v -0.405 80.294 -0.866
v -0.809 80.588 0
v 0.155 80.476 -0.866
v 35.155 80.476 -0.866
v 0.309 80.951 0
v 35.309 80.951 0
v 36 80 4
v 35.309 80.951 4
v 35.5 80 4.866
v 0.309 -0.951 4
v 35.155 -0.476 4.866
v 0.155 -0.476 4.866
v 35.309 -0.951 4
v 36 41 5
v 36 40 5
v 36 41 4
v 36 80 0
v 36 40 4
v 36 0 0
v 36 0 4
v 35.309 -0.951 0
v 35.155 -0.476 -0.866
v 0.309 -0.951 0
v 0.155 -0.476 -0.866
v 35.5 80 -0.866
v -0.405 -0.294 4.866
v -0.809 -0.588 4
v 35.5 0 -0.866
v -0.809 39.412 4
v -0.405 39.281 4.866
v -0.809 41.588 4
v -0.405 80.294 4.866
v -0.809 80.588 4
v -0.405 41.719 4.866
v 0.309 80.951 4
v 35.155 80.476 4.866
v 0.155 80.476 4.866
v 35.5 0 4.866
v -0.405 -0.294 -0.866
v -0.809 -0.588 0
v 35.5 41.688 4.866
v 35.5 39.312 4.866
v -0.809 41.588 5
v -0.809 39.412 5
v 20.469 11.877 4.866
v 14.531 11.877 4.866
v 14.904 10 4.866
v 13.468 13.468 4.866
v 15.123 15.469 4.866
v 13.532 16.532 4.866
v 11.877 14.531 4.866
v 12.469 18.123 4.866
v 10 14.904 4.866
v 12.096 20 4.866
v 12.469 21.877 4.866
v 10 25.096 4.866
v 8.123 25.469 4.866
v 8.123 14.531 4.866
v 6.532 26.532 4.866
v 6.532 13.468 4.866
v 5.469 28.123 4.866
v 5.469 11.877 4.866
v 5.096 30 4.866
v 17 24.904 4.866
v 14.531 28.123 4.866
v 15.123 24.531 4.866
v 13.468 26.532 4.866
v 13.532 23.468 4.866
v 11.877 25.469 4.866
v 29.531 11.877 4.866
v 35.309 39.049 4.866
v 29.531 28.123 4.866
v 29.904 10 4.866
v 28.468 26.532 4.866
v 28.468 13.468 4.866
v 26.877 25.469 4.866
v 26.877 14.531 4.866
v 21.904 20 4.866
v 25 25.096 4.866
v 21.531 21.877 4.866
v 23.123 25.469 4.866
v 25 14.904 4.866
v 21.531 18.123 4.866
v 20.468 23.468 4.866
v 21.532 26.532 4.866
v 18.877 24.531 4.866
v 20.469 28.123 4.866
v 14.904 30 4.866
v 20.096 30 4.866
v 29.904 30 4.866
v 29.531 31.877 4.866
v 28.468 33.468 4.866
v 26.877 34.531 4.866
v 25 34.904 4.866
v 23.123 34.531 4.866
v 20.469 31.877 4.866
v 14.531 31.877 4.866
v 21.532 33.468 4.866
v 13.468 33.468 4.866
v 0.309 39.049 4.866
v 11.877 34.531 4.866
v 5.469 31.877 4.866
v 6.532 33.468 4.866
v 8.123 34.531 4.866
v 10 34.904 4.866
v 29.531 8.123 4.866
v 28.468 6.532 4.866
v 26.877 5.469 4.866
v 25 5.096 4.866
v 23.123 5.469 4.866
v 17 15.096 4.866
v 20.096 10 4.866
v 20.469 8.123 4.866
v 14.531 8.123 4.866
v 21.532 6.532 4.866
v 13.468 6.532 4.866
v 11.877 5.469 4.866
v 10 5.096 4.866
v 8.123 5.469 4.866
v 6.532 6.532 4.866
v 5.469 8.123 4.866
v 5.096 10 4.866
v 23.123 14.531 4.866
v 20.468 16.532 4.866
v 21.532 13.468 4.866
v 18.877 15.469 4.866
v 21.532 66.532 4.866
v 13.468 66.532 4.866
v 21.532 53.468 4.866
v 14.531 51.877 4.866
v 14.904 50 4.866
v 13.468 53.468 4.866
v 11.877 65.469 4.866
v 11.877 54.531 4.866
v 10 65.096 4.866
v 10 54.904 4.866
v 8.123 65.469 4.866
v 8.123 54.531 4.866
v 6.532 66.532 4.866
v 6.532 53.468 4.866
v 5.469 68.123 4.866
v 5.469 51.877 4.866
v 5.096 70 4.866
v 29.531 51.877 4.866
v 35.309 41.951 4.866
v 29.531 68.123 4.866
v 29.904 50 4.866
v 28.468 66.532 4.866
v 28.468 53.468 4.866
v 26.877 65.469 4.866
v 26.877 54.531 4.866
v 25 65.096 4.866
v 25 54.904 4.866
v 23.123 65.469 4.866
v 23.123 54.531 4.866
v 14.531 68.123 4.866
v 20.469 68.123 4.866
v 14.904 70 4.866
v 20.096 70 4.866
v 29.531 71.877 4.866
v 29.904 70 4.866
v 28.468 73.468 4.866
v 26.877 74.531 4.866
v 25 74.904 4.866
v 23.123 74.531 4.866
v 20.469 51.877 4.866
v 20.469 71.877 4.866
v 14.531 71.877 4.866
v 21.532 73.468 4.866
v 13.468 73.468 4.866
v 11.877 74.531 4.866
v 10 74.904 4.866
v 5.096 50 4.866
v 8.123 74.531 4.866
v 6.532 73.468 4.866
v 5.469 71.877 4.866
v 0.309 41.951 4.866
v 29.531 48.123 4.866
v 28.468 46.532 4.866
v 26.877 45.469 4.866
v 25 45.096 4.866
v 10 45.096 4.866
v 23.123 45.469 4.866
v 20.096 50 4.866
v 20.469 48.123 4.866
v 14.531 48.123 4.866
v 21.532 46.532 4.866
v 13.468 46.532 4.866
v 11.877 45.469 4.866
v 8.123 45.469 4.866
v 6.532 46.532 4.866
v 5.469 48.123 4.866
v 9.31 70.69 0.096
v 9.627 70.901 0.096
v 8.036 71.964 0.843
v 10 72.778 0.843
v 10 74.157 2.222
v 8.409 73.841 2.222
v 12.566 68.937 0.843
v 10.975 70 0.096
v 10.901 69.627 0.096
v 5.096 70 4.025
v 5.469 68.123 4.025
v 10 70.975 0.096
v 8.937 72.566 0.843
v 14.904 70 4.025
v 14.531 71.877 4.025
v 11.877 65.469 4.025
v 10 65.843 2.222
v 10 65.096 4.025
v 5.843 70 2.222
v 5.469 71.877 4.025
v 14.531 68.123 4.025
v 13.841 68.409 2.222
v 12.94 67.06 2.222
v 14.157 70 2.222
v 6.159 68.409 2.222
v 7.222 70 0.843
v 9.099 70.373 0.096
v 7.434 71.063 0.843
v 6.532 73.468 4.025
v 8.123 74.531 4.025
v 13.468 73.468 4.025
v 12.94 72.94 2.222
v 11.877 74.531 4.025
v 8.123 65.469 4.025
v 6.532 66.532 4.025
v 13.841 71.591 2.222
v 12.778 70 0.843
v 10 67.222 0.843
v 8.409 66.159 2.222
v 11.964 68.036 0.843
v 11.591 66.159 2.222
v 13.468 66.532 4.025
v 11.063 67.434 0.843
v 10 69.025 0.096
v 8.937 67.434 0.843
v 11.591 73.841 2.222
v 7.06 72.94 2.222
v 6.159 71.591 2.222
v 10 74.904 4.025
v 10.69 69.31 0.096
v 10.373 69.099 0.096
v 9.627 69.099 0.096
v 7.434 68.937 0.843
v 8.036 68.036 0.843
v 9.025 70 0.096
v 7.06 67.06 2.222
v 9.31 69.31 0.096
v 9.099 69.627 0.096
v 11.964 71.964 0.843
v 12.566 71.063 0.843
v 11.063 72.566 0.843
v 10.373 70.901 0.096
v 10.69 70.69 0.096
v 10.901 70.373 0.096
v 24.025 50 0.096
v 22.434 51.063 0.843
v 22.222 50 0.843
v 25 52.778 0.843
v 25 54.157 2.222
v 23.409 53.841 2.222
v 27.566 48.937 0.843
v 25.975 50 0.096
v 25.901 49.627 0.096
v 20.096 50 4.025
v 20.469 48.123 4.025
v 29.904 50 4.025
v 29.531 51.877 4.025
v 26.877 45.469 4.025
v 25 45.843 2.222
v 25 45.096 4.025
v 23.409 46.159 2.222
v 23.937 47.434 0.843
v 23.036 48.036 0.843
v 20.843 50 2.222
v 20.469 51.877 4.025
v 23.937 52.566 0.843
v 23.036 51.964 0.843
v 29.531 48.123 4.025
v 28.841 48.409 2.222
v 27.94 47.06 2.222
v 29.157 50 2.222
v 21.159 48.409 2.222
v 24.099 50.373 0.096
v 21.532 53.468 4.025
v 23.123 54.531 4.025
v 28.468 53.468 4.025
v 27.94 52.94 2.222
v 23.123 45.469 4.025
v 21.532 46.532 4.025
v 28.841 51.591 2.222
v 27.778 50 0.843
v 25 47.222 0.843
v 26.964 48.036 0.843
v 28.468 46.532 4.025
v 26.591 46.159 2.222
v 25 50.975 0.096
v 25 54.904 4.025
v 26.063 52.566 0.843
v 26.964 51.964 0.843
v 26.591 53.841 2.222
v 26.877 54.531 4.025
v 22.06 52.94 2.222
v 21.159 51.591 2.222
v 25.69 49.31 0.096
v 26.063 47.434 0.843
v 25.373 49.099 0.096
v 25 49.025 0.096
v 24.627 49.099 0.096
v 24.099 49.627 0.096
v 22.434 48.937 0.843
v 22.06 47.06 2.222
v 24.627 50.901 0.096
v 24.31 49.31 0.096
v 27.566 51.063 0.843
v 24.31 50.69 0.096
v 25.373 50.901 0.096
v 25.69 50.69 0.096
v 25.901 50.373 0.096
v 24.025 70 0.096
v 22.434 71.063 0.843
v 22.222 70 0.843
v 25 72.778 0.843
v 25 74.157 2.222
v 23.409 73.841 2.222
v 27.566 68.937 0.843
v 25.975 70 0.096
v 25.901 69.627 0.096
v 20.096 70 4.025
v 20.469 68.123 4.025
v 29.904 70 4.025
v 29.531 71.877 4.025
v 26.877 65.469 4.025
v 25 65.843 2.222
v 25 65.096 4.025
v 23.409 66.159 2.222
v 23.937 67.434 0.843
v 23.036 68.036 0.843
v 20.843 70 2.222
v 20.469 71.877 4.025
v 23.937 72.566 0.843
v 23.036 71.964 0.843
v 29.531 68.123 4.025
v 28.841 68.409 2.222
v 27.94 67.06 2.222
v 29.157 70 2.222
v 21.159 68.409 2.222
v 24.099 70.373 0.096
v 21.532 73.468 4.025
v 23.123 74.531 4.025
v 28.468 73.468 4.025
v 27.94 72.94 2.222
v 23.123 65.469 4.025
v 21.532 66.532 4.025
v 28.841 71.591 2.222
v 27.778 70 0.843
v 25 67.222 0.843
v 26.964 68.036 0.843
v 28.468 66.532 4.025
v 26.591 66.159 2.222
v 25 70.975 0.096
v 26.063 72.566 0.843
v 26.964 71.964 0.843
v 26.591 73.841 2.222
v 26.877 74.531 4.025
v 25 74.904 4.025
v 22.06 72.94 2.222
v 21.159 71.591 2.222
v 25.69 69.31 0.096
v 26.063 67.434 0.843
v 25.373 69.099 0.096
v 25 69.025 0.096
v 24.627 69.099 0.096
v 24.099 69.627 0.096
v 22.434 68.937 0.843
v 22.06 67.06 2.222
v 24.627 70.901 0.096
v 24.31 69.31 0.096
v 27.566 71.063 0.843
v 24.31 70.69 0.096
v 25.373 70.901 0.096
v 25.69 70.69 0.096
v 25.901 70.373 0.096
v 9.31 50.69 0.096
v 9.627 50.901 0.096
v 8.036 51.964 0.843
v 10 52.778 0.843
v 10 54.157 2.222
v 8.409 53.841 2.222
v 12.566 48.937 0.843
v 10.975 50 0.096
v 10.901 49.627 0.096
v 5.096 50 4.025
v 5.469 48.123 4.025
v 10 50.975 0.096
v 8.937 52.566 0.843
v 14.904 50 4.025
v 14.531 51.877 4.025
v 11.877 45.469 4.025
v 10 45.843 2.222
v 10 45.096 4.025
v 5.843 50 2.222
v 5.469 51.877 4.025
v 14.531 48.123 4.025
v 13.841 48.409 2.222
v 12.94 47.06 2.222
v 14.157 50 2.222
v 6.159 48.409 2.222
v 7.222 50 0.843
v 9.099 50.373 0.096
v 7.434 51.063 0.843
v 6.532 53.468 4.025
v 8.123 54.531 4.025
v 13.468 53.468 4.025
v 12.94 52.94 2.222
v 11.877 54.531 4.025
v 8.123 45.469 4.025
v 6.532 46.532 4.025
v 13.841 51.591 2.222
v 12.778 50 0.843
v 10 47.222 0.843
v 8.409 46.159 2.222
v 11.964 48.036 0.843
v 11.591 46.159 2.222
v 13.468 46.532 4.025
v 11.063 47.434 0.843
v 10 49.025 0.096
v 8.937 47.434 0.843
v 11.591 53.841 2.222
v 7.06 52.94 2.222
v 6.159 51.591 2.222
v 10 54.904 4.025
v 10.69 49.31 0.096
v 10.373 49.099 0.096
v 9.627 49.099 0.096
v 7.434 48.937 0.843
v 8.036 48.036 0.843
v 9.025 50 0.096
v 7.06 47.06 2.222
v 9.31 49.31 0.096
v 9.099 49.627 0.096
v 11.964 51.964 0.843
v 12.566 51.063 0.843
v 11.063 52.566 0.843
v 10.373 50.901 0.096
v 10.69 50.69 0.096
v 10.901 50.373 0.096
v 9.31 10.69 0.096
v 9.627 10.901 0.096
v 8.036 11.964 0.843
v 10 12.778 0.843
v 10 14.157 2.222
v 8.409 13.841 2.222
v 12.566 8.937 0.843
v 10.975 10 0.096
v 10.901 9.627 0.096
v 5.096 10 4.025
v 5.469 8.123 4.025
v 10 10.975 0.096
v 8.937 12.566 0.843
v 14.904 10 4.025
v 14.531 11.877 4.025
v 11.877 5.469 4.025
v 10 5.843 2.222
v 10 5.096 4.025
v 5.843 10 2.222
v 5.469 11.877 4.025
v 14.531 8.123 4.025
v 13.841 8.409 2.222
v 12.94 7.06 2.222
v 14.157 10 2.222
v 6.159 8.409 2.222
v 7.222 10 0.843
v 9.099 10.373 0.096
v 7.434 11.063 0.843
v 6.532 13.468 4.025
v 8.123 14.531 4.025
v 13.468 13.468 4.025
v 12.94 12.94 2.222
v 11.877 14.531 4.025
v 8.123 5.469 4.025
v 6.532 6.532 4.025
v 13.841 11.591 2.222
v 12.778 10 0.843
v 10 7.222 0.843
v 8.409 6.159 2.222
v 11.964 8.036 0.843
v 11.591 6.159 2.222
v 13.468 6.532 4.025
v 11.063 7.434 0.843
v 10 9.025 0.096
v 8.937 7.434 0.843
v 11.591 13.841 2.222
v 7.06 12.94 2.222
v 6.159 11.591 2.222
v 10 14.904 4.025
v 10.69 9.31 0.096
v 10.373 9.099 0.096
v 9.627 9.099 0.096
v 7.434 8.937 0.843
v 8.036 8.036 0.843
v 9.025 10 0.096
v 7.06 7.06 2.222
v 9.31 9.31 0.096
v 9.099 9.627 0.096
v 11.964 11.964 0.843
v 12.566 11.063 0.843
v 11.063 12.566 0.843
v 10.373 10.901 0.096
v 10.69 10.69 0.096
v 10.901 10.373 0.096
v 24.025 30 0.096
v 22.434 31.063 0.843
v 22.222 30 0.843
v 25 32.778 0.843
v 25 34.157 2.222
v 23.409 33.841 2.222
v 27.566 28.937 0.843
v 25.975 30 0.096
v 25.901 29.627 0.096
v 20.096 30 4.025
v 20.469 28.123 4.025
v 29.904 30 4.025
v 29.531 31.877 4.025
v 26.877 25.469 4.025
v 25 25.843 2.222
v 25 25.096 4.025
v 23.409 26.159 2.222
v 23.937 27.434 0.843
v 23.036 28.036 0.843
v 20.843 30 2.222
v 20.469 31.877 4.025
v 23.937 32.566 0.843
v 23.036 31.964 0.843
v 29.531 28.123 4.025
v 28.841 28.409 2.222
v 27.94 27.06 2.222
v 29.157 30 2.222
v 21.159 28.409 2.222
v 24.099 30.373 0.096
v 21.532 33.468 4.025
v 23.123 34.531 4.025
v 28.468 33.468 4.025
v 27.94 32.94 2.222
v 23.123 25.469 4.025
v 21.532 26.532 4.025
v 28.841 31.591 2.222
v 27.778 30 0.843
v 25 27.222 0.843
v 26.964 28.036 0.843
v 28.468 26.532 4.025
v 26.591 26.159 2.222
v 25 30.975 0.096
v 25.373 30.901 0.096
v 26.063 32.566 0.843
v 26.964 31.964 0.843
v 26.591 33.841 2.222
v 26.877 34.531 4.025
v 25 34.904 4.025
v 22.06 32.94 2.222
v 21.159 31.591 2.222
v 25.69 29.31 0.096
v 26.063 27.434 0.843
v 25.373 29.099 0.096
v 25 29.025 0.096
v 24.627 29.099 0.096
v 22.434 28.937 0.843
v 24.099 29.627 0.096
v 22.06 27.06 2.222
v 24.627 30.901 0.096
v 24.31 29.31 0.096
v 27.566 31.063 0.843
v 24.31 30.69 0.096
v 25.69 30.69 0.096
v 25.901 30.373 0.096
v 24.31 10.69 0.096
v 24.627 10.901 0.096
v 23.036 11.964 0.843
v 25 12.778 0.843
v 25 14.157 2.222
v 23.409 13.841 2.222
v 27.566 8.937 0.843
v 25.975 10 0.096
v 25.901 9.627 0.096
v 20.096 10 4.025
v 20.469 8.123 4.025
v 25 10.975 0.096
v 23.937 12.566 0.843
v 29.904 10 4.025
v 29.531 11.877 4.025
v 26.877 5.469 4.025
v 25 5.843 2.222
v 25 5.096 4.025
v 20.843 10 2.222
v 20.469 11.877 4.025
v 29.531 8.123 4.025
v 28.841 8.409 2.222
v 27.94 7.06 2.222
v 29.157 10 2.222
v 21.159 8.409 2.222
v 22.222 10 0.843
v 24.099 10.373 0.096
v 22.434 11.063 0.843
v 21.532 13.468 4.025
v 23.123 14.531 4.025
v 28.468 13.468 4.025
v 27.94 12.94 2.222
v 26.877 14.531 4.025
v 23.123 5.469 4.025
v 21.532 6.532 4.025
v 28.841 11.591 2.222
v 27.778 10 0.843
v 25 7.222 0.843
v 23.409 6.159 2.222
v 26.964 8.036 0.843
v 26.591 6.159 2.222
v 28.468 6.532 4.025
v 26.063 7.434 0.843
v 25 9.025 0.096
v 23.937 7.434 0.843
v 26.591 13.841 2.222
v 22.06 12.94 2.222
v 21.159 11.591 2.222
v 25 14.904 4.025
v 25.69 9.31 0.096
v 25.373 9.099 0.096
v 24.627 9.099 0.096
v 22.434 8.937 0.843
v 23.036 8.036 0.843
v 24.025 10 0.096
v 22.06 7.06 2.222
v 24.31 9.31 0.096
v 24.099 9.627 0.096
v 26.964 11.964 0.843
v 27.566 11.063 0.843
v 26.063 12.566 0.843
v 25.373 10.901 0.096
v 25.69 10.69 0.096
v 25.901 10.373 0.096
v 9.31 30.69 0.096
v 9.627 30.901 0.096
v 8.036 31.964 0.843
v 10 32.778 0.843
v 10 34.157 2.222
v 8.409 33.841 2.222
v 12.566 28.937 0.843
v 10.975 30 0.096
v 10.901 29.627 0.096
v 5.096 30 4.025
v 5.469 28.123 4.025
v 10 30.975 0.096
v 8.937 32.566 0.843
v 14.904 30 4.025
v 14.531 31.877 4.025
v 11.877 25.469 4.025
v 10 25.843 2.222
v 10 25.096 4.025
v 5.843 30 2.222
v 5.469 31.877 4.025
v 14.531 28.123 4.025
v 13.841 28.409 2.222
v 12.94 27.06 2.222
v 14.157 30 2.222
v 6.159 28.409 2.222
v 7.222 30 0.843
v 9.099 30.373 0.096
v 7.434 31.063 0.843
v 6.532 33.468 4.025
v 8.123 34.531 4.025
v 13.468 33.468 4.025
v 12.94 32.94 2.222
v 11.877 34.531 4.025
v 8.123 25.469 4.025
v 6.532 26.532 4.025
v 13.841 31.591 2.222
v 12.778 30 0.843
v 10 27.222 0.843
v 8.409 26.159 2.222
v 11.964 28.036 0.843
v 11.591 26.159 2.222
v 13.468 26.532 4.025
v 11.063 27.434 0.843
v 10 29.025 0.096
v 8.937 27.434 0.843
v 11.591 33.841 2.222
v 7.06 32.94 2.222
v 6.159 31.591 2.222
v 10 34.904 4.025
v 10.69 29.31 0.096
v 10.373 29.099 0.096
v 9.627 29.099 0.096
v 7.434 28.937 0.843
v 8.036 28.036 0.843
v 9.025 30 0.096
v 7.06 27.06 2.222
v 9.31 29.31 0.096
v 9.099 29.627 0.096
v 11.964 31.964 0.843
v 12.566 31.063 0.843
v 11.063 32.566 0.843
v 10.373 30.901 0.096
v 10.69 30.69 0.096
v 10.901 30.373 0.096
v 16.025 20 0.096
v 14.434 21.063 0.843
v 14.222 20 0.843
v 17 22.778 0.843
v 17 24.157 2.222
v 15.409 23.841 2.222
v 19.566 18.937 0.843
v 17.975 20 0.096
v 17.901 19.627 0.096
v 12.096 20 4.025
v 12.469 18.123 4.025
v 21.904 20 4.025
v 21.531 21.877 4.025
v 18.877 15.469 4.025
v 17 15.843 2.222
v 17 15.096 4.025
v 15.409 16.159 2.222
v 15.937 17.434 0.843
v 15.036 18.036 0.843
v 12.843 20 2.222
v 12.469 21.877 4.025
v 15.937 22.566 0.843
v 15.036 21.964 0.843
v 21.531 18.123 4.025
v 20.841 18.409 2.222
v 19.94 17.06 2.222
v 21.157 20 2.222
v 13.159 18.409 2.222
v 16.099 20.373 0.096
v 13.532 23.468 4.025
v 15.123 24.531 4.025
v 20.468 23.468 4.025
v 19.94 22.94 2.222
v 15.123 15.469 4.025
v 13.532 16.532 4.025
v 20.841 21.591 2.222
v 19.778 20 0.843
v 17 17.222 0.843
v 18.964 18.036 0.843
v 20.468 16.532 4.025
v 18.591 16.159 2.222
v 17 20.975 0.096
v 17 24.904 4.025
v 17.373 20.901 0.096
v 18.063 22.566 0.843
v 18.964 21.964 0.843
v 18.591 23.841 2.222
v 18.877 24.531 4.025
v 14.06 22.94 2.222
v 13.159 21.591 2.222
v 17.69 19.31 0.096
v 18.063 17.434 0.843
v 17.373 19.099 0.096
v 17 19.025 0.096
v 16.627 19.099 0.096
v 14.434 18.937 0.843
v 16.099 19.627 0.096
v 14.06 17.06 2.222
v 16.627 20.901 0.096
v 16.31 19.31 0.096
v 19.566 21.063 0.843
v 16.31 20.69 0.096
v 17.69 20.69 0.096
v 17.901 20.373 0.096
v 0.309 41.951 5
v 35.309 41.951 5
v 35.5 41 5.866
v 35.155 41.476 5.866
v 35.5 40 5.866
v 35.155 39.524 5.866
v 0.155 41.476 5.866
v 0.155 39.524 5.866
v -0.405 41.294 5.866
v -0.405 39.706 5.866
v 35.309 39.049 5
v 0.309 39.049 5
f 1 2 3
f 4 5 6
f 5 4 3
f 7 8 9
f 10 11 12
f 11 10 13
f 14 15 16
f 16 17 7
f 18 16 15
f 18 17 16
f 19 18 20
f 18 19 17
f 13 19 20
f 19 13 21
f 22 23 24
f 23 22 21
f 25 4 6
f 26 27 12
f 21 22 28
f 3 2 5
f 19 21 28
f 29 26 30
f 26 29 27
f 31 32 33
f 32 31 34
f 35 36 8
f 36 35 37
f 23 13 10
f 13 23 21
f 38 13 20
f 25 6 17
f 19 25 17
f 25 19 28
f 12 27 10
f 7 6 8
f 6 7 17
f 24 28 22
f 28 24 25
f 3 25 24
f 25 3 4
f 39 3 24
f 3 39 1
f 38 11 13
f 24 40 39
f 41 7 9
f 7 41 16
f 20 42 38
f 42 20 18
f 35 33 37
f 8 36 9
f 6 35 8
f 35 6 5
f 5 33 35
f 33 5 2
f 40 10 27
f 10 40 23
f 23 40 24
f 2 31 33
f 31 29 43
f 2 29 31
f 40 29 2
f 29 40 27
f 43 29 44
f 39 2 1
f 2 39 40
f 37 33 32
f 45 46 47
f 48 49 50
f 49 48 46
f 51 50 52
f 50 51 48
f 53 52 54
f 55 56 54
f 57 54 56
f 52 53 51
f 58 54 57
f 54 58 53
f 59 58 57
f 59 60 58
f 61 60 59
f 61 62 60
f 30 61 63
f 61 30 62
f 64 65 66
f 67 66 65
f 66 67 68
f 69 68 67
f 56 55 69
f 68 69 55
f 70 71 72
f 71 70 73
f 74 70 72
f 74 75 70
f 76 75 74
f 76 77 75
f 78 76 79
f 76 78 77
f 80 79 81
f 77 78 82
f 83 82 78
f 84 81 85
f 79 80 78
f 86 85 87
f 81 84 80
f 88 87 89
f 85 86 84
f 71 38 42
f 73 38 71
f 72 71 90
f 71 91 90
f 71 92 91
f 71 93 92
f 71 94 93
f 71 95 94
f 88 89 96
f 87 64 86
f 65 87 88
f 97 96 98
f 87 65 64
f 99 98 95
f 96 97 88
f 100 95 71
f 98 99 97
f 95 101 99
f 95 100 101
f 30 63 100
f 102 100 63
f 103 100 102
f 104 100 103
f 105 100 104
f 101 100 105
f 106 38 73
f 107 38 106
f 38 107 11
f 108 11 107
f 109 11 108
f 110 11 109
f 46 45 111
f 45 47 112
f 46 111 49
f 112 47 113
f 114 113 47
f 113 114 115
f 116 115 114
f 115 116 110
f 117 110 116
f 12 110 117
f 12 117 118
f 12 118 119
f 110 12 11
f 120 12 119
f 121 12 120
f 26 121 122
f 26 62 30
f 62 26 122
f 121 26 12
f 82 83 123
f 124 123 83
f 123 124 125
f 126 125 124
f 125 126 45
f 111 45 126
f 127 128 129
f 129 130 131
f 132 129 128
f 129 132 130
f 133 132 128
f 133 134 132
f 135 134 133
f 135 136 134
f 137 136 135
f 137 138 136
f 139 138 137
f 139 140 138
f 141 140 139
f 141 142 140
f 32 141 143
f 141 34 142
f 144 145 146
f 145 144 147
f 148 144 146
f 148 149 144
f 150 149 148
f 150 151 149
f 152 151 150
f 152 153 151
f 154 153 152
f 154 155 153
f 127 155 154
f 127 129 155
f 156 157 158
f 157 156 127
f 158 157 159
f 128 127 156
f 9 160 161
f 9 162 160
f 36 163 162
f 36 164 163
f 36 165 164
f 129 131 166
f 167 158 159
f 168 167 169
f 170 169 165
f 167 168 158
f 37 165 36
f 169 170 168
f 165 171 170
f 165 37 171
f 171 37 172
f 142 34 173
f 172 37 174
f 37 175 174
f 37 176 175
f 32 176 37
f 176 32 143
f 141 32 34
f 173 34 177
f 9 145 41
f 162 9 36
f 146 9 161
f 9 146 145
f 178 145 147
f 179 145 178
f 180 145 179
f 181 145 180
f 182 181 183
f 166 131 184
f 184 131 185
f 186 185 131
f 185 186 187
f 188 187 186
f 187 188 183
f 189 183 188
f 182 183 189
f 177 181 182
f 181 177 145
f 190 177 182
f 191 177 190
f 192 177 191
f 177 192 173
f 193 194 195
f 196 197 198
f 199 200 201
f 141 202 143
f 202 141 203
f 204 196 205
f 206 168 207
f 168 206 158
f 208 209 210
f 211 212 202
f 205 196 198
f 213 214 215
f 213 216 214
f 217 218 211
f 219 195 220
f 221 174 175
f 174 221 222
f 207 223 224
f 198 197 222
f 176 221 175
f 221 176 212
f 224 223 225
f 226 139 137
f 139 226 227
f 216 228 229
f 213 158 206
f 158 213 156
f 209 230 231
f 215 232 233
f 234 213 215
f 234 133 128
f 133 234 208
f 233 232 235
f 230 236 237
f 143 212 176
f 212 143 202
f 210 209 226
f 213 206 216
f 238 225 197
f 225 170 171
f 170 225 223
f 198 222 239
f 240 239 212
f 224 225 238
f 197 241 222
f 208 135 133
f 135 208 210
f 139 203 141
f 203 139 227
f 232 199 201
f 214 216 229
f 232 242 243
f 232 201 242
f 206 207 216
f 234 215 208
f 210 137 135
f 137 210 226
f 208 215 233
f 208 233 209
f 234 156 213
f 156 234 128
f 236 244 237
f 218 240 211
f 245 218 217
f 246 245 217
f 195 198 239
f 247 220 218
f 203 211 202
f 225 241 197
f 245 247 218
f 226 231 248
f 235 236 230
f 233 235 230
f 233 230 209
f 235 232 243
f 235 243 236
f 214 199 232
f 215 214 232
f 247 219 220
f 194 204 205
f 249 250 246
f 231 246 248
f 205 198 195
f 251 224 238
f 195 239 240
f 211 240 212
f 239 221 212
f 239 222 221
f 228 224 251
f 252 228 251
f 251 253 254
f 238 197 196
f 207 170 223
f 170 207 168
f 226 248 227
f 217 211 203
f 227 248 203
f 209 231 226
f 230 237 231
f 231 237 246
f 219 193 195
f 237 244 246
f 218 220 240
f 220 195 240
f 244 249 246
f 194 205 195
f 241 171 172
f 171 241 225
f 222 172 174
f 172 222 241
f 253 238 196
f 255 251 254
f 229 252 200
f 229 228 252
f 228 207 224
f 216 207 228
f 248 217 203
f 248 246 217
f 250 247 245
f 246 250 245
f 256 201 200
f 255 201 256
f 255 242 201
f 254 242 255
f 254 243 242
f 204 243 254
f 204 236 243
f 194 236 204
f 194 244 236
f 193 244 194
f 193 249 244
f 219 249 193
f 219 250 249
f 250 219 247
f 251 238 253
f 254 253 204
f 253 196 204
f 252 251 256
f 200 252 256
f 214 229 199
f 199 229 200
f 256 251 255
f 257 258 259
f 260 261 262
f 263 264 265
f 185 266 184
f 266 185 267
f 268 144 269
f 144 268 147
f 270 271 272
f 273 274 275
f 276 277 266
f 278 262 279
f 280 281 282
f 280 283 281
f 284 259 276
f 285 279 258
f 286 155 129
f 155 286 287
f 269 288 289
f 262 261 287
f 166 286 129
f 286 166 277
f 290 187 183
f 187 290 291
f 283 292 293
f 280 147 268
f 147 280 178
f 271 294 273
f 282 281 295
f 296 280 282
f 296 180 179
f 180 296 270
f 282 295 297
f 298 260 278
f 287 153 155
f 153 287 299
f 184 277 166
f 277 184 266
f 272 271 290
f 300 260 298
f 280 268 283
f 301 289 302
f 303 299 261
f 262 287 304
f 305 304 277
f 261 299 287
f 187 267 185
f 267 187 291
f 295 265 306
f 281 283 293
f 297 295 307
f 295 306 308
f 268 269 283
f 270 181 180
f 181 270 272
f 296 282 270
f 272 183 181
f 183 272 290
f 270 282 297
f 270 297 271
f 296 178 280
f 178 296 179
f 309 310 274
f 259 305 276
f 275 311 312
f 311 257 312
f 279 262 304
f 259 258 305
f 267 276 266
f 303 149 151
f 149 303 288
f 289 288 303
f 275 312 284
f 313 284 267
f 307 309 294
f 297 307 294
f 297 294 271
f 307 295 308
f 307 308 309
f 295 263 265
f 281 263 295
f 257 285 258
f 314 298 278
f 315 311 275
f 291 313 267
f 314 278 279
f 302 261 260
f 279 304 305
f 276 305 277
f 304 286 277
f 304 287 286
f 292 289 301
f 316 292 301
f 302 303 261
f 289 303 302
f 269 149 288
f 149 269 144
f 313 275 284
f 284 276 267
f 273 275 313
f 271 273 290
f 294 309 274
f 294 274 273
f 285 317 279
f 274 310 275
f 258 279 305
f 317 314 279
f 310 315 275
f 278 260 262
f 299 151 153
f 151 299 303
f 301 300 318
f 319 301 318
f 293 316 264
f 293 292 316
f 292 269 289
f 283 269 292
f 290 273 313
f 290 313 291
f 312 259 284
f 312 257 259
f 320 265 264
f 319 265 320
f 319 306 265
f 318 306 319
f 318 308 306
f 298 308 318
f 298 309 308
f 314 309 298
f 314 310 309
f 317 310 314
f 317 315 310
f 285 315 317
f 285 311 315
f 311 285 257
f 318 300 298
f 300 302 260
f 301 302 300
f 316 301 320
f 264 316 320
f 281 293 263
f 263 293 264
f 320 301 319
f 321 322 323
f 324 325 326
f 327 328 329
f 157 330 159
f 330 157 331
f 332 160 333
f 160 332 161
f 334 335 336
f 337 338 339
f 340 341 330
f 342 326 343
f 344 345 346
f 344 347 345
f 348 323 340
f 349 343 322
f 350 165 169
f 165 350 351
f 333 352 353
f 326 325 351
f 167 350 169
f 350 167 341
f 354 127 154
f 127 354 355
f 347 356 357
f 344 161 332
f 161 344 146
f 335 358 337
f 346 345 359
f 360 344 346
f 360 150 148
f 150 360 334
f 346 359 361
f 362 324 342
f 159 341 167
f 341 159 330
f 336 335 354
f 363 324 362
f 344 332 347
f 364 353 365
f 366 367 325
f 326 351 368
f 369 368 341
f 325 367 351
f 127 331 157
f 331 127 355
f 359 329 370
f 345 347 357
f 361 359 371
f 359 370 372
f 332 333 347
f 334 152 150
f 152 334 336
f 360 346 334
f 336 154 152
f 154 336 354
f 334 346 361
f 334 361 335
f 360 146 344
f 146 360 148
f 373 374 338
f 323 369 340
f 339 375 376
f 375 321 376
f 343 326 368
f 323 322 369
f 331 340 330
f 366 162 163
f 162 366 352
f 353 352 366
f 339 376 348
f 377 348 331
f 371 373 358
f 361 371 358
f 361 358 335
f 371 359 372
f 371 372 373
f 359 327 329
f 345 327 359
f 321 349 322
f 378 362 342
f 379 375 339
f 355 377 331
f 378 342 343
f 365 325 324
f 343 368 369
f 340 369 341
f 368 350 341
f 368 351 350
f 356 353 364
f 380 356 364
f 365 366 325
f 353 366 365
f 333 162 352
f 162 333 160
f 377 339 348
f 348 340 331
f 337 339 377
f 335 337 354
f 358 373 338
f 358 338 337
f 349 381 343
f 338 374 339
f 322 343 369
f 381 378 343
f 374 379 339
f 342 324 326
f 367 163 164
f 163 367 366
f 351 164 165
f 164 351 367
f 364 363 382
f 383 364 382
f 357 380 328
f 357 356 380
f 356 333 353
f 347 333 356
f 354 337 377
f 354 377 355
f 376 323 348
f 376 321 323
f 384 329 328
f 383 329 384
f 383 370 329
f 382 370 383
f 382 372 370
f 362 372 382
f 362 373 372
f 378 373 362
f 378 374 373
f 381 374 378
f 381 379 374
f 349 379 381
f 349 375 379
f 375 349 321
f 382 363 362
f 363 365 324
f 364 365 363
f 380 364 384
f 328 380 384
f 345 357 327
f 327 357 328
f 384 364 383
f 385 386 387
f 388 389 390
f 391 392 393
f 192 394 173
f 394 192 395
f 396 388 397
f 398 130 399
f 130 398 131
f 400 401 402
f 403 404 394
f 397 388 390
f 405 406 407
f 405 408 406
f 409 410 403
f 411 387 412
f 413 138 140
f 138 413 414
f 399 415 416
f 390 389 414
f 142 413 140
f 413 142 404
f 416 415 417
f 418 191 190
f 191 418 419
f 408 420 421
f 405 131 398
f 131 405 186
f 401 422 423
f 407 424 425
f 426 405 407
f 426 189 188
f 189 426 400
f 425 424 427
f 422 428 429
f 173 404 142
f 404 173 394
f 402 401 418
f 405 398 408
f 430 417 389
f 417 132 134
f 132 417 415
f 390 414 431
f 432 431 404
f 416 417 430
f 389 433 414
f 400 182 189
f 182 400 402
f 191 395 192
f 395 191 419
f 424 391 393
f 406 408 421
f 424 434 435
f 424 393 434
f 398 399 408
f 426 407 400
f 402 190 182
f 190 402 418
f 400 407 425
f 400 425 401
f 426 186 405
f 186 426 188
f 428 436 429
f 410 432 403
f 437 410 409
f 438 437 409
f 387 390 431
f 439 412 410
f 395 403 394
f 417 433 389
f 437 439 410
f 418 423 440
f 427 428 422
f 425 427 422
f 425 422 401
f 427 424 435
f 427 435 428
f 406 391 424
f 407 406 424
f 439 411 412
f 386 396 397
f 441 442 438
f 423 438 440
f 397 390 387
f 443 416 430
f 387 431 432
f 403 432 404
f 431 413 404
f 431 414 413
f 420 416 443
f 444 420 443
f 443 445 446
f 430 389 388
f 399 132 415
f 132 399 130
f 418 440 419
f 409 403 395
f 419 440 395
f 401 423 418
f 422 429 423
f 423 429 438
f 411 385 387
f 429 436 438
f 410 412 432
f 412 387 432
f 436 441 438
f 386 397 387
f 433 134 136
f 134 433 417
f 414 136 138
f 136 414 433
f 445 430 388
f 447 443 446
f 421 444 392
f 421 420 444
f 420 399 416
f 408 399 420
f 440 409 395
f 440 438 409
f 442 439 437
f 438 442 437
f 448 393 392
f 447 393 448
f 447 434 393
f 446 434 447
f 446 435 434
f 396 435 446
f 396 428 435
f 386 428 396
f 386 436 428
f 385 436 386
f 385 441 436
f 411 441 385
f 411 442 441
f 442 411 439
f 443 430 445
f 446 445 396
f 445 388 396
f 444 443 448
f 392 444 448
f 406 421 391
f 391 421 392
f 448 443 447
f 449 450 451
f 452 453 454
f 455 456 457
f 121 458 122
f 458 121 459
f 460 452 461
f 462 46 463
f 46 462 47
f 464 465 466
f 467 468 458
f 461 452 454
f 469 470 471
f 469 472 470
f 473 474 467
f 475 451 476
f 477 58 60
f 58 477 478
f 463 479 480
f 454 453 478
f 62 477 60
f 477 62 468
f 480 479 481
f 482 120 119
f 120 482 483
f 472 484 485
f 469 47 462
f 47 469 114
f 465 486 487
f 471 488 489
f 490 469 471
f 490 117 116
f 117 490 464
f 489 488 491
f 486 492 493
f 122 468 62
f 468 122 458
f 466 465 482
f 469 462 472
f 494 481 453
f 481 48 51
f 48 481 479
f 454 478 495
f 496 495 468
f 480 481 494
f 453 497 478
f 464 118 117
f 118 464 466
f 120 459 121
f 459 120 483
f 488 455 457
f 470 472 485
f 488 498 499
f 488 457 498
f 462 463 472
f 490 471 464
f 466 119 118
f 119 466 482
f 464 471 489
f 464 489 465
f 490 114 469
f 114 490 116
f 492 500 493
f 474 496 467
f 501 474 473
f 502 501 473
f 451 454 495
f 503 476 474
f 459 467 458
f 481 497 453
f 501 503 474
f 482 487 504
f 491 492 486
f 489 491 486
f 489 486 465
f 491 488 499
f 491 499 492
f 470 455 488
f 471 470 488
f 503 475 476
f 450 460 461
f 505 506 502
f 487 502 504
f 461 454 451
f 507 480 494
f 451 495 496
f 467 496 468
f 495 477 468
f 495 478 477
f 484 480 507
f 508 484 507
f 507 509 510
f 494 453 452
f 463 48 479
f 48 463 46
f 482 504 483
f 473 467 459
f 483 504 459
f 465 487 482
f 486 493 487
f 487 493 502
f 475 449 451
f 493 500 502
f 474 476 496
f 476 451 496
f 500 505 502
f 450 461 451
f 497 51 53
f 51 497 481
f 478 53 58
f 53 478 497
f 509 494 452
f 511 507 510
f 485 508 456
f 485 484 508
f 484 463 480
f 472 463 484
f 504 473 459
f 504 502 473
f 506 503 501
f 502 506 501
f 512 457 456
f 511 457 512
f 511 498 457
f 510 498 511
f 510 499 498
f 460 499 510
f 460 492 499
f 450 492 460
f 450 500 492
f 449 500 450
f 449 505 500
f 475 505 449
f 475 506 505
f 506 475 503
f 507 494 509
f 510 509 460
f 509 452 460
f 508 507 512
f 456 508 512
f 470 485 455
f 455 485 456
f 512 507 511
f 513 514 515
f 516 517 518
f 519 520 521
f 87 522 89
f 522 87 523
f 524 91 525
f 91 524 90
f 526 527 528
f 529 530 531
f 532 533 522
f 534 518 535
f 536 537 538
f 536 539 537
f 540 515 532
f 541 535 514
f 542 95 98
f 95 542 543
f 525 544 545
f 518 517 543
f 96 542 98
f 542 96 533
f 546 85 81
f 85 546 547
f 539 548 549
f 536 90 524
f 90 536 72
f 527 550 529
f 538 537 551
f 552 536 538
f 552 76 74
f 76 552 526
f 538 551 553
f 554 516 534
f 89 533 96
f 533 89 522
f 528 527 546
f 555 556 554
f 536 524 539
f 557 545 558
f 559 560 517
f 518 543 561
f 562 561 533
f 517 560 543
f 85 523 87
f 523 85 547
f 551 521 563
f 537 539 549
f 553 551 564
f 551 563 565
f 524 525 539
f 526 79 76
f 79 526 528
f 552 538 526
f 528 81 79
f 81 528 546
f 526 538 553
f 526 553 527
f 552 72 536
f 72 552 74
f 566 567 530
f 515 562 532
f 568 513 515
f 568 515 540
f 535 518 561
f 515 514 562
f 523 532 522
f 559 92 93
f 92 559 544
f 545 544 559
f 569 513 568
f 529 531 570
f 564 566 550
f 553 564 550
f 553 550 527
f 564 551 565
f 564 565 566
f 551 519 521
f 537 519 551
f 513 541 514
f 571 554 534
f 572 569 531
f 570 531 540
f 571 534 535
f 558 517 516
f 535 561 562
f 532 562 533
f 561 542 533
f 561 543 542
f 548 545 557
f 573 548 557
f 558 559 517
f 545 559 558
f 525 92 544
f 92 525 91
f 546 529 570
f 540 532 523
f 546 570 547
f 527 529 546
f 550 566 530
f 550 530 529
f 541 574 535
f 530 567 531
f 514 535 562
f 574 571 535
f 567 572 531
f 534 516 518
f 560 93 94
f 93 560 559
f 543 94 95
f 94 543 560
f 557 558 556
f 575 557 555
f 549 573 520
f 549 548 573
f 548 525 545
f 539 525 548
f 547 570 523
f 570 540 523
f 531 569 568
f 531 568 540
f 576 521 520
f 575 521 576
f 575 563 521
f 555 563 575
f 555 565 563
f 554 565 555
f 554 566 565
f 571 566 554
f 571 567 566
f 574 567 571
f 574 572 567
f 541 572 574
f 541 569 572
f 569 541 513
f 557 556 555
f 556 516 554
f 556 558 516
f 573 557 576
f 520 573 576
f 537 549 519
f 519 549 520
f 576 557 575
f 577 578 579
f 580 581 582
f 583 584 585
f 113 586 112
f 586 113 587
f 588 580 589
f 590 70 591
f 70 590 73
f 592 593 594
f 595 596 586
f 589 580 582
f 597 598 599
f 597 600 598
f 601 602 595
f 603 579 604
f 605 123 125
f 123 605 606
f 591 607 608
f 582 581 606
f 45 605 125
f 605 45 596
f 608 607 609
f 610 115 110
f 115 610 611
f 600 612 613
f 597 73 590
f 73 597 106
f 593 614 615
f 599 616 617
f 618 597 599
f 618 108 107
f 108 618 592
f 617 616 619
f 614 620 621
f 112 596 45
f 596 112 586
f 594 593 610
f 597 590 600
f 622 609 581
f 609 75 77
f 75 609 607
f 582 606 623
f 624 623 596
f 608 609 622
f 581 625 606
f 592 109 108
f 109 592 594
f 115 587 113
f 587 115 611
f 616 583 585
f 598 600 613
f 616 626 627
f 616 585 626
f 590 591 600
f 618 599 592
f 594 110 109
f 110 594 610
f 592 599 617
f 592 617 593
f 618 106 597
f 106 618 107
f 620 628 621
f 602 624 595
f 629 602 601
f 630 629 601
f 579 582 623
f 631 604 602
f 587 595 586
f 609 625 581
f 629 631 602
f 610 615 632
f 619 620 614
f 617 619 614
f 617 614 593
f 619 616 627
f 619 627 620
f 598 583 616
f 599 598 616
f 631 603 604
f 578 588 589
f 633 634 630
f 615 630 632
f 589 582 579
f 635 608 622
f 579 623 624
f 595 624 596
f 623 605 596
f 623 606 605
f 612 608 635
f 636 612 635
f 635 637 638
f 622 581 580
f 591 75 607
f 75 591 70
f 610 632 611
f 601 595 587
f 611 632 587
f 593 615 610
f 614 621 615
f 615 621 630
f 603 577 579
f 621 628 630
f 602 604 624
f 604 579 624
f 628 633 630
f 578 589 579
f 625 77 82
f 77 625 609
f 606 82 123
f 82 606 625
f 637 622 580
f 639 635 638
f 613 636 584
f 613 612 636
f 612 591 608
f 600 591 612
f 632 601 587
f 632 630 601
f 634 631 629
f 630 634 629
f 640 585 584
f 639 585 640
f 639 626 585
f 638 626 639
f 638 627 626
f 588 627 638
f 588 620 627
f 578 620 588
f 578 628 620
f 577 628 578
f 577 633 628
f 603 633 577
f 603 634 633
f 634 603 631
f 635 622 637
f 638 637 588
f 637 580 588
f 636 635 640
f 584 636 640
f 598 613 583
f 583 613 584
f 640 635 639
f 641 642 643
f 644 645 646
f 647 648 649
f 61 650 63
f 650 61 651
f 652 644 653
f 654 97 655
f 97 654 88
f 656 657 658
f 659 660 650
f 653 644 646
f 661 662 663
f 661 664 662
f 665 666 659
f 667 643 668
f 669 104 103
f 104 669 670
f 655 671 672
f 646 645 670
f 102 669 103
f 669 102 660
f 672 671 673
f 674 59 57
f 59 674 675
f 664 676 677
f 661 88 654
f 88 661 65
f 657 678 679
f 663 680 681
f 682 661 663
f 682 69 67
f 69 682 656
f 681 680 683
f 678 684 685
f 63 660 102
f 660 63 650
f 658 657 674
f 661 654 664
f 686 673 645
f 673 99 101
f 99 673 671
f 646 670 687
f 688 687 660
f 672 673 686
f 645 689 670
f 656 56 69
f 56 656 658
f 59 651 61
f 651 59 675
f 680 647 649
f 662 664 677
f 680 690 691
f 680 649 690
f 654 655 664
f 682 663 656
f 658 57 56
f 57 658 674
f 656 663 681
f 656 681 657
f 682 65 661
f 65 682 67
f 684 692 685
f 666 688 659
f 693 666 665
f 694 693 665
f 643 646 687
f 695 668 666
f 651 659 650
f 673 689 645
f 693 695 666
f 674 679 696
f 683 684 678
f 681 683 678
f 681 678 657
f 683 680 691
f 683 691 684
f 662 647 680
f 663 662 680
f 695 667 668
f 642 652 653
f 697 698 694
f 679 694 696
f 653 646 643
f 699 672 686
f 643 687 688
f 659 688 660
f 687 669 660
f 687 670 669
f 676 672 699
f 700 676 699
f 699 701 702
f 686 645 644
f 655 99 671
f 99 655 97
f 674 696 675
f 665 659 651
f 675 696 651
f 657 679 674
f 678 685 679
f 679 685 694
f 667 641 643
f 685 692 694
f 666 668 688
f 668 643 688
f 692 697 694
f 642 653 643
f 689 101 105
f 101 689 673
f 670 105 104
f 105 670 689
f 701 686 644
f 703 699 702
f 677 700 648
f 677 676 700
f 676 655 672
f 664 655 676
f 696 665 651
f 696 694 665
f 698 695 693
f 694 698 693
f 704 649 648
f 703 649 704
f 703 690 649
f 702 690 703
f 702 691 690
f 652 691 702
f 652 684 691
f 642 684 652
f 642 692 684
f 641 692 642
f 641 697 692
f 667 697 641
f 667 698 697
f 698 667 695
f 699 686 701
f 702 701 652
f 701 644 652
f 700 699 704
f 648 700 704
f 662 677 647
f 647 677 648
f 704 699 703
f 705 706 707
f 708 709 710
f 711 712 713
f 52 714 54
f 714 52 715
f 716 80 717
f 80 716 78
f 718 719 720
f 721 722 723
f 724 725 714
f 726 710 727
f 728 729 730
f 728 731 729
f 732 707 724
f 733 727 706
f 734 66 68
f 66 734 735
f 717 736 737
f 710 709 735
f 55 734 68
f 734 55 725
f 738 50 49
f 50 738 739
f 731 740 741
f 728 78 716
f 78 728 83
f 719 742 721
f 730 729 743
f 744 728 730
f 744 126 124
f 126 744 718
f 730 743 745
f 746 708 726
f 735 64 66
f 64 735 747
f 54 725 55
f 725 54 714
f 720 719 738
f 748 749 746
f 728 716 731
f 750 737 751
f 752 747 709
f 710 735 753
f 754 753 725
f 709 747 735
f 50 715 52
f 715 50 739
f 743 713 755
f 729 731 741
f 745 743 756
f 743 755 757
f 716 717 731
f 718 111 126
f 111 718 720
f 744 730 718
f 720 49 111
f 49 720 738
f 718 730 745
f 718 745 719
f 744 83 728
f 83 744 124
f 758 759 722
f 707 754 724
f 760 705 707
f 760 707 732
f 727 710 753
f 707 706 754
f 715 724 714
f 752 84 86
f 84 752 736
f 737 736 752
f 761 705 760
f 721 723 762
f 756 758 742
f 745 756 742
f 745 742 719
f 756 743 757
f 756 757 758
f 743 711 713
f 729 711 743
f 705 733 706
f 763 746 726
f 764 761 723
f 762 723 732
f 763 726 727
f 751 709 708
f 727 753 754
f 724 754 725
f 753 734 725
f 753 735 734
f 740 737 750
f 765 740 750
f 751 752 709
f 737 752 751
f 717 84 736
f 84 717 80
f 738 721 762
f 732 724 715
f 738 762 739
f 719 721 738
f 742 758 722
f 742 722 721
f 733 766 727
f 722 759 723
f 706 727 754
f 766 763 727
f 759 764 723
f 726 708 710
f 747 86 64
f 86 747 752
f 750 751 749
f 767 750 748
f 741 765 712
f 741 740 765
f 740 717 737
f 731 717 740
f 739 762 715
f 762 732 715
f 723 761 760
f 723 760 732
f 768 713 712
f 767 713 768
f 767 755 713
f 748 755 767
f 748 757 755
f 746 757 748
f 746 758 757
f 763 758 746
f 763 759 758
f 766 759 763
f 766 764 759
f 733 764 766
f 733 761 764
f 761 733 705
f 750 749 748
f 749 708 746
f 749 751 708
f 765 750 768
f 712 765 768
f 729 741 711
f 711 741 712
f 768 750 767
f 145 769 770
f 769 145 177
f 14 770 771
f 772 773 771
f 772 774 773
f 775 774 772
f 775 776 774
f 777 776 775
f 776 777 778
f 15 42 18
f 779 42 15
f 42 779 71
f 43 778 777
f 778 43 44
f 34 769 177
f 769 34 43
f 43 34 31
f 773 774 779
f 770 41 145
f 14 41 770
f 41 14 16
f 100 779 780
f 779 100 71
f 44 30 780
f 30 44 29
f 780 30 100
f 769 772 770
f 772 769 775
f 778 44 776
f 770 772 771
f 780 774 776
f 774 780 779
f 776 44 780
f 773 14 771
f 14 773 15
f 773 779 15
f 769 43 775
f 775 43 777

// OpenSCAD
// Loguncov Maxim 13.12.13

//$fn=128;


translate([0,40,0])
minkowski()
{cube([35,1,5]);
sphere(1);
}

difference() {

//основа
minkowski()
{cube([35,80,4]);
sphere(1);
}

//отверстия
translate([10,70,5])sphere(5);
translate([25,50,5])sphere(5);
translate([25,70,5])sphere(5);
translate([10,50,5])sphere(5);


translate([10,10,5])sphere(5);
translate([25,30,5])sphere(5);
translate([25,10,5])sphere(5);
translate([10,30,5])sphere(5);
translate([17,20,5])sphere(5);

}
